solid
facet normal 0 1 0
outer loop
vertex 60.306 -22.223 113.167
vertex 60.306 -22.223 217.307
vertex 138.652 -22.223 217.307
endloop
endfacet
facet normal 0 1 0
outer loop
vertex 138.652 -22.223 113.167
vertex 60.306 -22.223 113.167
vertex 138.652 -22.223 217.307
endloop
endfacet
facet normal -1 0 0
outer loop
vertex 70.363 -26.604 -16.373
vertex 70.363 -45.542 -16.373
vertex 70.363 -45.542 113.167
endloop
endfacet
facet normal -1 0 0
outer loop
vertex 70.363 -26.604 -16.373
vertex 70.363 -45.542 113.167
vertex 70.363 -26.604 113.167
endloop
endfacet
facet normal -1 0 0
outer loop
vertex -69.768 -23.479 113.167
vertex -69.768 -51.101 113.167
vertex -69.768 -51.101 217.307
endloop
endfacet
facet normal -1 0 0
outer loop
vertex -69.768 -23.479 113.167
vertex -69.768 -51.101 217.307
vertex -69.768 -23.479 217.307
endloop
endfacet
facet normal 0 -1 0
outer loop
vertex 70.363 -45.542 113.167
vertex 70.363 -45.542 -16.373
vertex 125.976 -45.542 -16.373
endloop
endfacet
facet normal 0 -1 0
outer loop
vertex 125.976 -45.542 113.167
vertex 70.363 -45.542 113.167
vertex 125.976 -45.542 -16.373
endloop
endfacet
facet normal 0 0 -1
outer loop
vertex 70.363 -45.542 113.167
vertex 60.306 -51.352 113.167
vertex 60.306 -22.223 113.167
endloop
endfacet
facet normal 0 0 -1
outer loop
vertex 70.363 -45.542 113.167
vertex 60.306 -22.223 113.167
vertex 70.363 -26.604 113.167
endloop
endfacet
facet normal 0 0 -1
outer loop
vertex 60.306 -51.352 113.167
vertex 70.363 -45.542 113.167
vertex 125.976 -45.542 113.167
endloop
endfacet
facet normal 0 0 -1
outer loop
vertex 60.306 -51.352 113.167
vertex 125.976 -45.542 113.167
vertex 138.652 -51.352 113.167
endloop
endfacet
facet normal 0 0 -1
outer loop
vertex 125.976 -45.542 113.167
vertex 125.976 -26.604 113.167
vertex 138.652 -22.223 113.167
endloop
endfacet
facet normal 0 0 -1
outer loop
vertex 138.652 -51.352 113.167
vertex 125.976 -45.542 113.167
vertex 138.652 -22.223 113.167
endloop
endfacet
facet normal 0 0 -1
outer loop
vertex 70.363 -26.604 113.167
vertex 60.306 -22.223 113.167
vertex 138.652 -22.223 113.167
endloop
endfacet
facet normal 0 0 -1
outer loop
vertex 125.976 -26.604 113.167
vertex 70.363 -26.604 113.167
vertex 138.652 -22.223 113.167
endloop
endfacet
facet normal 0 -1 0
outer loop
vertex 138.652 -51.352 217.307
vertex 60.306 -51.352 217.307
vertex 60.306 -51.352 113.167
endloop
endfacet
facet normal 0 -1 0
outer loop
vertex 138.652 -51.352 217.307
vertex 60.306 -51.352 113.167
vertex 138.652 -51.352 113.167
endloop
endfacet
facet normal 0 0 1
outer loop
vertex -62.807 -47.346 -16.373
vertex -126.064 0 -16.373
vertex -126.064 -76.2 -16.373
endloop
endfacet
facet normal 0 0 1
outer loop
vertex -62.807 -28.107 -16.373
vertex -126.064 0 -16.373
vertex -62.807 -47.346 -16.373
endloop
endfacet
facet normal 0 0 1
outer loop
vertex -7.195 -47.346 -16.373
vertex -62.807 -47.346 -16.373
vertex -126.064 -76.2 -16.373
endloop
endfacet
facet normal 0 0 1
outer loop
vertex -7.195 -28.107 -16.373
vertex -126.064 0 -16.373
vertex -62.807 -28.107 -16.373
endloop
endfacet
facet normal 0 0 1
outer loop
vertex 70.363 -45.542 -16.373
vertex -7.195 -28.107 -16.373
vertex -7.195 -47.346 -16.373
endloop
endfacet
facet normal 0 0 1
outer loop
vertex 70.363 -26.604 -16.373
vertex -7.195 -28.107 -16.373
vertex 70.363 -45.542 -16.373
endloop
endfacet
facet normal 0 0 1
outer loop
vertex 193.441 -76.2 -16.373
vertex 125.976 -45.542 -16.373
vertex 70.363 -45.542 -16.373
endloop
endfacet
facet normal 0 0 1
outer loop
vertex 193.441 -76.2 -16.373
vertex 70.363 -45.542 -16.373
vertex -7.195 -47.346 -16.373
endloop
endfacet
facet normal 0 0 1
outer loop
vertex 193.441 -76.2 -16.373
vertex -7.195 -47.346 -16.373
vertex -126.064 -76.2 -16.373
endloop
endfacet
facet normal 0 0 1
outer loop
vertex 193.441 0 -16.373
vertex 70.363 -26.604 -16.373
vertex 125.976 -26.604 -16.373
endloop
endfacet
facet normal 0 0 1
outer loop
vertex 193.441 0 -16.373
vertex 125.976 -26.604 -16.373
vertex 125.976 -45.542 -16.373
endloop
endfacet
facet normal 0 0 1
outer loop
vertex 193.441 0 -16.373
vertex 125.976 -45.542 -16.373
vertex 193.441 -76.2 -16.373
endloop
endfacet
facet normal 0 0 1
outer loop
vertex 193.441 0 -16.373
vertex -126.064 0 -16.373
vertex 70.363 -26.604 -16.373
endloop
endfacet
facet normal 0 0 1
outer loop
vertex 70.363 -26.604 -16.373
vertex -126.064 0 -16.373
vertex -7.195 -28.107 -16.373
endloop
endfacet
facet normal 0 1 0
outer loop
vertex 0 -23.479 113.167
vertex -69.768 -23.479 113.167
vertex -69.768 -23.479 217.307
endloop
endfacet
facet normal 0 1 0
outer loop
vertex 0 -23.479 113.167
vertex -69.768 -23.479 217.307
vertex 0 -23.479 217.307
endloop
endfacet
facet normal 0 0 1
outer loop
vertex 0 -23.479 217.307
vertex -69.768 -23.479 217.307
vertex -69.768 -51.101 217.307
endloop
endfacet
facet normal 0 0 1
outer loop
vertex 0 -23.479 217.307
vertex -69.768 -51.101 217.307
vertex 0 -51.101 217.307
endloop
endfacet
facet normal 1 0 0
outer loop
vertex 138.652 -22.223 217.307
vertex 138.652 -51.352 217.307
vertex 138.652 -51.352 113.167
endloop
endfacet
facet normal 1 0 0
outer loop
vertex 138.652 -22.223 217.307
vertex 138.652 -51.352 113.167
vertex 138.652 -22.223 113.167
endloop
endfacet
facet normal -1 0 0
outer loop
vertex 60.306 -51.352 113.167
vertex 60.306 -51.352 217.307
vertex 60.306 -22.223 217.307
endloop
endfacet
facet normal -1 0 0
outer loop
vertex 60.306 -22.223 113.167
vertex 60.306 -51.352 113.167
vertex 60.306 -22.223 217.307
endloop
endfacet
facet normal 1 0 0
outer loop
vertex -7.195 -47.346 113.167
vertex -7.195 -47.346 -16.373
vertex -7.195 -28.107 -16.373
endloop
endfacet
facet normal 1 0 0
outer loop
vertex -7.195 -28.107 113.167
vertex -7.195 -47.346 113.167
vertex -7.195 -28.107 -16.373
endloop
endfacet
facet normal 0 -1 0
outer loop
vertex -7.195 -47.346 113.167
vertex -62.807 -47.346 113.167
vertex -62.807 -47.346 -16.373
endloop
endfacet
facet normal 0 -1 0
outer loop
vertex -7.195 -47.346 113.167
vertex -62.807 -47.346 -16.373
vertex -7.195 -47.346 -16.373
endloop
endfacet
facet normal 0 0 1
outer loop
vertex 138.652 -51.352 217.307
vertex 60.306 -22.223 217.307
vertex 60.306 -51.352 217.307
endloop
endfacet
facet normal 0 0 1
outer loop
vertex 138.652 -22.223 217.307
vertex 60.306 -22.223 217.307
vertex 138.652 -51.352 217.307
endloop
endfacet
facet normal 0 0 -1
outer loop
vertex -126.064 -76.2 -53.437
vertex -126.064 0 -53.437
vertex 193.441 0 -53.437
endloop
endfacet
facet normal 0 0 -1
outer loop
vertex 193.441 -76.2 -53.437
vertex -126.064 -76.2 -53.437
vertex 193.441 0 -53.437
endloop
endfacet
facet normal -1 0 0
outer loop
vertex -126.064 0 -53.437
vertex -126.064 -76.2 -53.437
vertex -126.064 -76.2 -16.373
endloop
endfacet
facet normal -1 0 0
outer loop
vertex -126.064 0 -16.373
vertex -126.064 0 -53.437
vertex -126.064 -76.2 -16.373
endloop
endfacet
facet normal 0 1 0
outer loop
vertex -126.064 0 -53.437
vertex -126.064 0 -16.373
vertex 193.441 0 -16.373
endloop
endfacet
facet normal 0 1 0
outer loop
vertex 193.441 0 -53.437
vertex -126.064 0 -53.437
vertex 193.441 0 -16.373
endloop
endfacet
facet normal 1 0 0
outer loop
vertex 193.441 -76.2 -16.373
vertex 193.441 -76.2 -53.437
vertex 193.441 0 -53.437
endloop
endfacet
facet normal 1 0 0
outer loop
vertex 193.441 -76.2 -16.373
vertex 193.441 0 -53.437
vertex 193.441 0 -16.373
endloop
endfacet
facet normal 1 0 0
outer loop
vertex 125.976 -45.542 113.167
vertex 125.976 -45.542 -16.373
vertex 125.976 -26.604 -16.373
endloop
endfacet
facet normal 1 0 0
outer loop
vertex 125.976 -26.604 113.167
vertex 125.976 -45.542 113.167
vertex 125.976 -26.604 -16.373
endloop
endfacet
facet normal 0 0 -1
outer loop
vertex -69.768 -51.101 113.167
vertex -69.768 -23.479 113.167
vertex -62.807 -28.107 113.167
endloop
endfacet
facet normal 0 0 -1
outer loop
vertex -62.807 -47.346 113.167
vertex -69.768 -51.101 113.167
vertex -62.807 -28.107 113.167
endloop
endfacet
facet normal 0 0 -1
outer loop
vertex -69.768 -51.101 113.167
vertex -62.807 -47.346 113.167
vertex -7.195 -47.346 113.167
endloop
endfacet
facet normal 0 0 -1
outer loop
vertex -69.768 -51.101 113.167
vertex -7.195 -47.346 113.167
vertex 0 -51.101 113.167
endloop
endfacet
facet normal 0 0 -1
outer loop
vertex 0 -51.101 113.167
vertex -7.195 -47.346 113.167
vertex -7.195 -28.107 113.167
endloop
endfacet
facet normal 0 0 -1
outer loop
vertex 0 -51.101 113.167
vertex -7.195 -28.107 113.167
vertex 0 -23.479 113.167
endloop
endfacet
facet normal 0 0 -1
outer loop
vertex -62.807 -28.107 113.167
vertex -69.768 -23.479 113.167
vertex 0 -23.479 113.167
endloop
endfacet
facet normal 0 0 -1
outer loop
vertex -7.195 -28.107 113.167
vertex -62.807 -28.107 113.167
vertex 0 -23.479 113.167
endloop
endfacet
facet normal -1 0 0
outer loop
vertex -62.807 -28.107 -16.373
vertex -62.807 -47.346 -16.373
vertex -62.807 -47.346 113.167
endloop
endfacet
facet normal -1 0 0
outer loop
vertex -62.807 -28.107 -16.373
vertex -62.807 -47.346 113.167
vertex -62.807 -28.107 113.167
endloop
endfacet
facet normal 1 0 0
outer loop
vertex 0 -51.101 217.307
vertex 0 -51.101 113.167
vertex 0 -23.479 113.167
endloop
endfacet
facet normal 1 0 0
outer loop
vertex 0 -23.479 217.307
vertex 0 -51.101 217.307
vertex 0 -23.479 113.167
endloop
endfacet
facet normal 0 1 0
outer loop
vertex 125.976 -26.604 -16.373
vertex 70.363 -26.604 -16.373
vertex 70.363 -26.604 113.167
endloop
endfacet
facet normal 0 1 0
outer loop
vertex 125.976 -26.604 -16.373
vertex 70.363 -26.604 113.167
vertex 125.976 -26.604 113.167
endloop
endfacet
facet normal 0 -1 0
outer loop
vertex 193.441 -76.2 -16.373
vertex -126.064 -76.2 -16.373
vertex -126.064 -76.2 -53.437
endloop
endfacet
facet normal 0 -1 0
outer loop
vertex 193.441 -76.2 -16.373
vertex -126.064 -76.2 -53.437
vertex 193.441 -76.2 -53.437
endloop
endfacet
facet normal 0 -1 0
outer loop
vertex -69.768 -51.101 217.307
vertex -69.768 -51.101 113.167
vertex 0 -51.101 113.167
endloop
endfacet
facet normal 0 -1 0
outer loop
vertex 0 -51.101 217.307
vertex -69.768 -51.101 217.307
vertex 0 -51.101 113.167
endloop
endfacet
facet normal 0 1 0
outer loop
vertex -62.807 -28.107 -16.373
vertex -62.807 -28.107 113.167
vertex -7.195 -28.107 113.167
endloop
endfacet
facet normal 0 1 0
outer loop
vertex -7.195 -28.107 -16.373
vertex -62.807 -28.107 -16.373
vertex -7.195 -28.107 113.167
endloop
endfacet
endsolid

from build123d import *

# Parameters (mm, degrees)
F0_W     = 319.505253
F0_H     = 37.063959
F1_DEPTH = 76.2
F2_W     = 55.612809
F2_H     = 19.239029
F2_W_2   = 55.61281
F2_H_2   = 18.938417
F3_DEPTH = 129.54
F4_W     = 69.768153
F4_H     = 27.621901
F4_W_2   = 78.345757
F4_H_2   = 29.128553
F5_DEPTH = 104.14


with BuildPart() as f1:
    # F0 (on Front) → F1 (new body)
    with BuildSketch(Plane.XZ):
        with Locations((33.688419, -34.904941)):
            Rectangle(F0_W, F0_H)
    extrude(amount=F1_DEPTH)

    # F2 (on face) → F3 (join)
    with BuildSketch(Plane.XY.offset(-16.372962)):
        with Locations((-35.000917, -37.726529)):
            Rectangle(F2_W, F2_H)
        with Locations((98.169219, -36.073173)):
            Rectangle(F2_W_2, F2_H_2)
    extrude(amount=F3_DEPTH)

    # F4 (on face) → F5 (join)
    with BuildSketch(Plane.XY.offset(113.167038)):
        with Locations((-34.884076, -37.289564)):
            Rectangle(F4_W, F4_H)
        with Locations((99.47876, -36.787349)):
            Rectangle(F4_W_2, F4_H_2)
    extrude(amount=F5_DEPTH)


solid = f1.part
